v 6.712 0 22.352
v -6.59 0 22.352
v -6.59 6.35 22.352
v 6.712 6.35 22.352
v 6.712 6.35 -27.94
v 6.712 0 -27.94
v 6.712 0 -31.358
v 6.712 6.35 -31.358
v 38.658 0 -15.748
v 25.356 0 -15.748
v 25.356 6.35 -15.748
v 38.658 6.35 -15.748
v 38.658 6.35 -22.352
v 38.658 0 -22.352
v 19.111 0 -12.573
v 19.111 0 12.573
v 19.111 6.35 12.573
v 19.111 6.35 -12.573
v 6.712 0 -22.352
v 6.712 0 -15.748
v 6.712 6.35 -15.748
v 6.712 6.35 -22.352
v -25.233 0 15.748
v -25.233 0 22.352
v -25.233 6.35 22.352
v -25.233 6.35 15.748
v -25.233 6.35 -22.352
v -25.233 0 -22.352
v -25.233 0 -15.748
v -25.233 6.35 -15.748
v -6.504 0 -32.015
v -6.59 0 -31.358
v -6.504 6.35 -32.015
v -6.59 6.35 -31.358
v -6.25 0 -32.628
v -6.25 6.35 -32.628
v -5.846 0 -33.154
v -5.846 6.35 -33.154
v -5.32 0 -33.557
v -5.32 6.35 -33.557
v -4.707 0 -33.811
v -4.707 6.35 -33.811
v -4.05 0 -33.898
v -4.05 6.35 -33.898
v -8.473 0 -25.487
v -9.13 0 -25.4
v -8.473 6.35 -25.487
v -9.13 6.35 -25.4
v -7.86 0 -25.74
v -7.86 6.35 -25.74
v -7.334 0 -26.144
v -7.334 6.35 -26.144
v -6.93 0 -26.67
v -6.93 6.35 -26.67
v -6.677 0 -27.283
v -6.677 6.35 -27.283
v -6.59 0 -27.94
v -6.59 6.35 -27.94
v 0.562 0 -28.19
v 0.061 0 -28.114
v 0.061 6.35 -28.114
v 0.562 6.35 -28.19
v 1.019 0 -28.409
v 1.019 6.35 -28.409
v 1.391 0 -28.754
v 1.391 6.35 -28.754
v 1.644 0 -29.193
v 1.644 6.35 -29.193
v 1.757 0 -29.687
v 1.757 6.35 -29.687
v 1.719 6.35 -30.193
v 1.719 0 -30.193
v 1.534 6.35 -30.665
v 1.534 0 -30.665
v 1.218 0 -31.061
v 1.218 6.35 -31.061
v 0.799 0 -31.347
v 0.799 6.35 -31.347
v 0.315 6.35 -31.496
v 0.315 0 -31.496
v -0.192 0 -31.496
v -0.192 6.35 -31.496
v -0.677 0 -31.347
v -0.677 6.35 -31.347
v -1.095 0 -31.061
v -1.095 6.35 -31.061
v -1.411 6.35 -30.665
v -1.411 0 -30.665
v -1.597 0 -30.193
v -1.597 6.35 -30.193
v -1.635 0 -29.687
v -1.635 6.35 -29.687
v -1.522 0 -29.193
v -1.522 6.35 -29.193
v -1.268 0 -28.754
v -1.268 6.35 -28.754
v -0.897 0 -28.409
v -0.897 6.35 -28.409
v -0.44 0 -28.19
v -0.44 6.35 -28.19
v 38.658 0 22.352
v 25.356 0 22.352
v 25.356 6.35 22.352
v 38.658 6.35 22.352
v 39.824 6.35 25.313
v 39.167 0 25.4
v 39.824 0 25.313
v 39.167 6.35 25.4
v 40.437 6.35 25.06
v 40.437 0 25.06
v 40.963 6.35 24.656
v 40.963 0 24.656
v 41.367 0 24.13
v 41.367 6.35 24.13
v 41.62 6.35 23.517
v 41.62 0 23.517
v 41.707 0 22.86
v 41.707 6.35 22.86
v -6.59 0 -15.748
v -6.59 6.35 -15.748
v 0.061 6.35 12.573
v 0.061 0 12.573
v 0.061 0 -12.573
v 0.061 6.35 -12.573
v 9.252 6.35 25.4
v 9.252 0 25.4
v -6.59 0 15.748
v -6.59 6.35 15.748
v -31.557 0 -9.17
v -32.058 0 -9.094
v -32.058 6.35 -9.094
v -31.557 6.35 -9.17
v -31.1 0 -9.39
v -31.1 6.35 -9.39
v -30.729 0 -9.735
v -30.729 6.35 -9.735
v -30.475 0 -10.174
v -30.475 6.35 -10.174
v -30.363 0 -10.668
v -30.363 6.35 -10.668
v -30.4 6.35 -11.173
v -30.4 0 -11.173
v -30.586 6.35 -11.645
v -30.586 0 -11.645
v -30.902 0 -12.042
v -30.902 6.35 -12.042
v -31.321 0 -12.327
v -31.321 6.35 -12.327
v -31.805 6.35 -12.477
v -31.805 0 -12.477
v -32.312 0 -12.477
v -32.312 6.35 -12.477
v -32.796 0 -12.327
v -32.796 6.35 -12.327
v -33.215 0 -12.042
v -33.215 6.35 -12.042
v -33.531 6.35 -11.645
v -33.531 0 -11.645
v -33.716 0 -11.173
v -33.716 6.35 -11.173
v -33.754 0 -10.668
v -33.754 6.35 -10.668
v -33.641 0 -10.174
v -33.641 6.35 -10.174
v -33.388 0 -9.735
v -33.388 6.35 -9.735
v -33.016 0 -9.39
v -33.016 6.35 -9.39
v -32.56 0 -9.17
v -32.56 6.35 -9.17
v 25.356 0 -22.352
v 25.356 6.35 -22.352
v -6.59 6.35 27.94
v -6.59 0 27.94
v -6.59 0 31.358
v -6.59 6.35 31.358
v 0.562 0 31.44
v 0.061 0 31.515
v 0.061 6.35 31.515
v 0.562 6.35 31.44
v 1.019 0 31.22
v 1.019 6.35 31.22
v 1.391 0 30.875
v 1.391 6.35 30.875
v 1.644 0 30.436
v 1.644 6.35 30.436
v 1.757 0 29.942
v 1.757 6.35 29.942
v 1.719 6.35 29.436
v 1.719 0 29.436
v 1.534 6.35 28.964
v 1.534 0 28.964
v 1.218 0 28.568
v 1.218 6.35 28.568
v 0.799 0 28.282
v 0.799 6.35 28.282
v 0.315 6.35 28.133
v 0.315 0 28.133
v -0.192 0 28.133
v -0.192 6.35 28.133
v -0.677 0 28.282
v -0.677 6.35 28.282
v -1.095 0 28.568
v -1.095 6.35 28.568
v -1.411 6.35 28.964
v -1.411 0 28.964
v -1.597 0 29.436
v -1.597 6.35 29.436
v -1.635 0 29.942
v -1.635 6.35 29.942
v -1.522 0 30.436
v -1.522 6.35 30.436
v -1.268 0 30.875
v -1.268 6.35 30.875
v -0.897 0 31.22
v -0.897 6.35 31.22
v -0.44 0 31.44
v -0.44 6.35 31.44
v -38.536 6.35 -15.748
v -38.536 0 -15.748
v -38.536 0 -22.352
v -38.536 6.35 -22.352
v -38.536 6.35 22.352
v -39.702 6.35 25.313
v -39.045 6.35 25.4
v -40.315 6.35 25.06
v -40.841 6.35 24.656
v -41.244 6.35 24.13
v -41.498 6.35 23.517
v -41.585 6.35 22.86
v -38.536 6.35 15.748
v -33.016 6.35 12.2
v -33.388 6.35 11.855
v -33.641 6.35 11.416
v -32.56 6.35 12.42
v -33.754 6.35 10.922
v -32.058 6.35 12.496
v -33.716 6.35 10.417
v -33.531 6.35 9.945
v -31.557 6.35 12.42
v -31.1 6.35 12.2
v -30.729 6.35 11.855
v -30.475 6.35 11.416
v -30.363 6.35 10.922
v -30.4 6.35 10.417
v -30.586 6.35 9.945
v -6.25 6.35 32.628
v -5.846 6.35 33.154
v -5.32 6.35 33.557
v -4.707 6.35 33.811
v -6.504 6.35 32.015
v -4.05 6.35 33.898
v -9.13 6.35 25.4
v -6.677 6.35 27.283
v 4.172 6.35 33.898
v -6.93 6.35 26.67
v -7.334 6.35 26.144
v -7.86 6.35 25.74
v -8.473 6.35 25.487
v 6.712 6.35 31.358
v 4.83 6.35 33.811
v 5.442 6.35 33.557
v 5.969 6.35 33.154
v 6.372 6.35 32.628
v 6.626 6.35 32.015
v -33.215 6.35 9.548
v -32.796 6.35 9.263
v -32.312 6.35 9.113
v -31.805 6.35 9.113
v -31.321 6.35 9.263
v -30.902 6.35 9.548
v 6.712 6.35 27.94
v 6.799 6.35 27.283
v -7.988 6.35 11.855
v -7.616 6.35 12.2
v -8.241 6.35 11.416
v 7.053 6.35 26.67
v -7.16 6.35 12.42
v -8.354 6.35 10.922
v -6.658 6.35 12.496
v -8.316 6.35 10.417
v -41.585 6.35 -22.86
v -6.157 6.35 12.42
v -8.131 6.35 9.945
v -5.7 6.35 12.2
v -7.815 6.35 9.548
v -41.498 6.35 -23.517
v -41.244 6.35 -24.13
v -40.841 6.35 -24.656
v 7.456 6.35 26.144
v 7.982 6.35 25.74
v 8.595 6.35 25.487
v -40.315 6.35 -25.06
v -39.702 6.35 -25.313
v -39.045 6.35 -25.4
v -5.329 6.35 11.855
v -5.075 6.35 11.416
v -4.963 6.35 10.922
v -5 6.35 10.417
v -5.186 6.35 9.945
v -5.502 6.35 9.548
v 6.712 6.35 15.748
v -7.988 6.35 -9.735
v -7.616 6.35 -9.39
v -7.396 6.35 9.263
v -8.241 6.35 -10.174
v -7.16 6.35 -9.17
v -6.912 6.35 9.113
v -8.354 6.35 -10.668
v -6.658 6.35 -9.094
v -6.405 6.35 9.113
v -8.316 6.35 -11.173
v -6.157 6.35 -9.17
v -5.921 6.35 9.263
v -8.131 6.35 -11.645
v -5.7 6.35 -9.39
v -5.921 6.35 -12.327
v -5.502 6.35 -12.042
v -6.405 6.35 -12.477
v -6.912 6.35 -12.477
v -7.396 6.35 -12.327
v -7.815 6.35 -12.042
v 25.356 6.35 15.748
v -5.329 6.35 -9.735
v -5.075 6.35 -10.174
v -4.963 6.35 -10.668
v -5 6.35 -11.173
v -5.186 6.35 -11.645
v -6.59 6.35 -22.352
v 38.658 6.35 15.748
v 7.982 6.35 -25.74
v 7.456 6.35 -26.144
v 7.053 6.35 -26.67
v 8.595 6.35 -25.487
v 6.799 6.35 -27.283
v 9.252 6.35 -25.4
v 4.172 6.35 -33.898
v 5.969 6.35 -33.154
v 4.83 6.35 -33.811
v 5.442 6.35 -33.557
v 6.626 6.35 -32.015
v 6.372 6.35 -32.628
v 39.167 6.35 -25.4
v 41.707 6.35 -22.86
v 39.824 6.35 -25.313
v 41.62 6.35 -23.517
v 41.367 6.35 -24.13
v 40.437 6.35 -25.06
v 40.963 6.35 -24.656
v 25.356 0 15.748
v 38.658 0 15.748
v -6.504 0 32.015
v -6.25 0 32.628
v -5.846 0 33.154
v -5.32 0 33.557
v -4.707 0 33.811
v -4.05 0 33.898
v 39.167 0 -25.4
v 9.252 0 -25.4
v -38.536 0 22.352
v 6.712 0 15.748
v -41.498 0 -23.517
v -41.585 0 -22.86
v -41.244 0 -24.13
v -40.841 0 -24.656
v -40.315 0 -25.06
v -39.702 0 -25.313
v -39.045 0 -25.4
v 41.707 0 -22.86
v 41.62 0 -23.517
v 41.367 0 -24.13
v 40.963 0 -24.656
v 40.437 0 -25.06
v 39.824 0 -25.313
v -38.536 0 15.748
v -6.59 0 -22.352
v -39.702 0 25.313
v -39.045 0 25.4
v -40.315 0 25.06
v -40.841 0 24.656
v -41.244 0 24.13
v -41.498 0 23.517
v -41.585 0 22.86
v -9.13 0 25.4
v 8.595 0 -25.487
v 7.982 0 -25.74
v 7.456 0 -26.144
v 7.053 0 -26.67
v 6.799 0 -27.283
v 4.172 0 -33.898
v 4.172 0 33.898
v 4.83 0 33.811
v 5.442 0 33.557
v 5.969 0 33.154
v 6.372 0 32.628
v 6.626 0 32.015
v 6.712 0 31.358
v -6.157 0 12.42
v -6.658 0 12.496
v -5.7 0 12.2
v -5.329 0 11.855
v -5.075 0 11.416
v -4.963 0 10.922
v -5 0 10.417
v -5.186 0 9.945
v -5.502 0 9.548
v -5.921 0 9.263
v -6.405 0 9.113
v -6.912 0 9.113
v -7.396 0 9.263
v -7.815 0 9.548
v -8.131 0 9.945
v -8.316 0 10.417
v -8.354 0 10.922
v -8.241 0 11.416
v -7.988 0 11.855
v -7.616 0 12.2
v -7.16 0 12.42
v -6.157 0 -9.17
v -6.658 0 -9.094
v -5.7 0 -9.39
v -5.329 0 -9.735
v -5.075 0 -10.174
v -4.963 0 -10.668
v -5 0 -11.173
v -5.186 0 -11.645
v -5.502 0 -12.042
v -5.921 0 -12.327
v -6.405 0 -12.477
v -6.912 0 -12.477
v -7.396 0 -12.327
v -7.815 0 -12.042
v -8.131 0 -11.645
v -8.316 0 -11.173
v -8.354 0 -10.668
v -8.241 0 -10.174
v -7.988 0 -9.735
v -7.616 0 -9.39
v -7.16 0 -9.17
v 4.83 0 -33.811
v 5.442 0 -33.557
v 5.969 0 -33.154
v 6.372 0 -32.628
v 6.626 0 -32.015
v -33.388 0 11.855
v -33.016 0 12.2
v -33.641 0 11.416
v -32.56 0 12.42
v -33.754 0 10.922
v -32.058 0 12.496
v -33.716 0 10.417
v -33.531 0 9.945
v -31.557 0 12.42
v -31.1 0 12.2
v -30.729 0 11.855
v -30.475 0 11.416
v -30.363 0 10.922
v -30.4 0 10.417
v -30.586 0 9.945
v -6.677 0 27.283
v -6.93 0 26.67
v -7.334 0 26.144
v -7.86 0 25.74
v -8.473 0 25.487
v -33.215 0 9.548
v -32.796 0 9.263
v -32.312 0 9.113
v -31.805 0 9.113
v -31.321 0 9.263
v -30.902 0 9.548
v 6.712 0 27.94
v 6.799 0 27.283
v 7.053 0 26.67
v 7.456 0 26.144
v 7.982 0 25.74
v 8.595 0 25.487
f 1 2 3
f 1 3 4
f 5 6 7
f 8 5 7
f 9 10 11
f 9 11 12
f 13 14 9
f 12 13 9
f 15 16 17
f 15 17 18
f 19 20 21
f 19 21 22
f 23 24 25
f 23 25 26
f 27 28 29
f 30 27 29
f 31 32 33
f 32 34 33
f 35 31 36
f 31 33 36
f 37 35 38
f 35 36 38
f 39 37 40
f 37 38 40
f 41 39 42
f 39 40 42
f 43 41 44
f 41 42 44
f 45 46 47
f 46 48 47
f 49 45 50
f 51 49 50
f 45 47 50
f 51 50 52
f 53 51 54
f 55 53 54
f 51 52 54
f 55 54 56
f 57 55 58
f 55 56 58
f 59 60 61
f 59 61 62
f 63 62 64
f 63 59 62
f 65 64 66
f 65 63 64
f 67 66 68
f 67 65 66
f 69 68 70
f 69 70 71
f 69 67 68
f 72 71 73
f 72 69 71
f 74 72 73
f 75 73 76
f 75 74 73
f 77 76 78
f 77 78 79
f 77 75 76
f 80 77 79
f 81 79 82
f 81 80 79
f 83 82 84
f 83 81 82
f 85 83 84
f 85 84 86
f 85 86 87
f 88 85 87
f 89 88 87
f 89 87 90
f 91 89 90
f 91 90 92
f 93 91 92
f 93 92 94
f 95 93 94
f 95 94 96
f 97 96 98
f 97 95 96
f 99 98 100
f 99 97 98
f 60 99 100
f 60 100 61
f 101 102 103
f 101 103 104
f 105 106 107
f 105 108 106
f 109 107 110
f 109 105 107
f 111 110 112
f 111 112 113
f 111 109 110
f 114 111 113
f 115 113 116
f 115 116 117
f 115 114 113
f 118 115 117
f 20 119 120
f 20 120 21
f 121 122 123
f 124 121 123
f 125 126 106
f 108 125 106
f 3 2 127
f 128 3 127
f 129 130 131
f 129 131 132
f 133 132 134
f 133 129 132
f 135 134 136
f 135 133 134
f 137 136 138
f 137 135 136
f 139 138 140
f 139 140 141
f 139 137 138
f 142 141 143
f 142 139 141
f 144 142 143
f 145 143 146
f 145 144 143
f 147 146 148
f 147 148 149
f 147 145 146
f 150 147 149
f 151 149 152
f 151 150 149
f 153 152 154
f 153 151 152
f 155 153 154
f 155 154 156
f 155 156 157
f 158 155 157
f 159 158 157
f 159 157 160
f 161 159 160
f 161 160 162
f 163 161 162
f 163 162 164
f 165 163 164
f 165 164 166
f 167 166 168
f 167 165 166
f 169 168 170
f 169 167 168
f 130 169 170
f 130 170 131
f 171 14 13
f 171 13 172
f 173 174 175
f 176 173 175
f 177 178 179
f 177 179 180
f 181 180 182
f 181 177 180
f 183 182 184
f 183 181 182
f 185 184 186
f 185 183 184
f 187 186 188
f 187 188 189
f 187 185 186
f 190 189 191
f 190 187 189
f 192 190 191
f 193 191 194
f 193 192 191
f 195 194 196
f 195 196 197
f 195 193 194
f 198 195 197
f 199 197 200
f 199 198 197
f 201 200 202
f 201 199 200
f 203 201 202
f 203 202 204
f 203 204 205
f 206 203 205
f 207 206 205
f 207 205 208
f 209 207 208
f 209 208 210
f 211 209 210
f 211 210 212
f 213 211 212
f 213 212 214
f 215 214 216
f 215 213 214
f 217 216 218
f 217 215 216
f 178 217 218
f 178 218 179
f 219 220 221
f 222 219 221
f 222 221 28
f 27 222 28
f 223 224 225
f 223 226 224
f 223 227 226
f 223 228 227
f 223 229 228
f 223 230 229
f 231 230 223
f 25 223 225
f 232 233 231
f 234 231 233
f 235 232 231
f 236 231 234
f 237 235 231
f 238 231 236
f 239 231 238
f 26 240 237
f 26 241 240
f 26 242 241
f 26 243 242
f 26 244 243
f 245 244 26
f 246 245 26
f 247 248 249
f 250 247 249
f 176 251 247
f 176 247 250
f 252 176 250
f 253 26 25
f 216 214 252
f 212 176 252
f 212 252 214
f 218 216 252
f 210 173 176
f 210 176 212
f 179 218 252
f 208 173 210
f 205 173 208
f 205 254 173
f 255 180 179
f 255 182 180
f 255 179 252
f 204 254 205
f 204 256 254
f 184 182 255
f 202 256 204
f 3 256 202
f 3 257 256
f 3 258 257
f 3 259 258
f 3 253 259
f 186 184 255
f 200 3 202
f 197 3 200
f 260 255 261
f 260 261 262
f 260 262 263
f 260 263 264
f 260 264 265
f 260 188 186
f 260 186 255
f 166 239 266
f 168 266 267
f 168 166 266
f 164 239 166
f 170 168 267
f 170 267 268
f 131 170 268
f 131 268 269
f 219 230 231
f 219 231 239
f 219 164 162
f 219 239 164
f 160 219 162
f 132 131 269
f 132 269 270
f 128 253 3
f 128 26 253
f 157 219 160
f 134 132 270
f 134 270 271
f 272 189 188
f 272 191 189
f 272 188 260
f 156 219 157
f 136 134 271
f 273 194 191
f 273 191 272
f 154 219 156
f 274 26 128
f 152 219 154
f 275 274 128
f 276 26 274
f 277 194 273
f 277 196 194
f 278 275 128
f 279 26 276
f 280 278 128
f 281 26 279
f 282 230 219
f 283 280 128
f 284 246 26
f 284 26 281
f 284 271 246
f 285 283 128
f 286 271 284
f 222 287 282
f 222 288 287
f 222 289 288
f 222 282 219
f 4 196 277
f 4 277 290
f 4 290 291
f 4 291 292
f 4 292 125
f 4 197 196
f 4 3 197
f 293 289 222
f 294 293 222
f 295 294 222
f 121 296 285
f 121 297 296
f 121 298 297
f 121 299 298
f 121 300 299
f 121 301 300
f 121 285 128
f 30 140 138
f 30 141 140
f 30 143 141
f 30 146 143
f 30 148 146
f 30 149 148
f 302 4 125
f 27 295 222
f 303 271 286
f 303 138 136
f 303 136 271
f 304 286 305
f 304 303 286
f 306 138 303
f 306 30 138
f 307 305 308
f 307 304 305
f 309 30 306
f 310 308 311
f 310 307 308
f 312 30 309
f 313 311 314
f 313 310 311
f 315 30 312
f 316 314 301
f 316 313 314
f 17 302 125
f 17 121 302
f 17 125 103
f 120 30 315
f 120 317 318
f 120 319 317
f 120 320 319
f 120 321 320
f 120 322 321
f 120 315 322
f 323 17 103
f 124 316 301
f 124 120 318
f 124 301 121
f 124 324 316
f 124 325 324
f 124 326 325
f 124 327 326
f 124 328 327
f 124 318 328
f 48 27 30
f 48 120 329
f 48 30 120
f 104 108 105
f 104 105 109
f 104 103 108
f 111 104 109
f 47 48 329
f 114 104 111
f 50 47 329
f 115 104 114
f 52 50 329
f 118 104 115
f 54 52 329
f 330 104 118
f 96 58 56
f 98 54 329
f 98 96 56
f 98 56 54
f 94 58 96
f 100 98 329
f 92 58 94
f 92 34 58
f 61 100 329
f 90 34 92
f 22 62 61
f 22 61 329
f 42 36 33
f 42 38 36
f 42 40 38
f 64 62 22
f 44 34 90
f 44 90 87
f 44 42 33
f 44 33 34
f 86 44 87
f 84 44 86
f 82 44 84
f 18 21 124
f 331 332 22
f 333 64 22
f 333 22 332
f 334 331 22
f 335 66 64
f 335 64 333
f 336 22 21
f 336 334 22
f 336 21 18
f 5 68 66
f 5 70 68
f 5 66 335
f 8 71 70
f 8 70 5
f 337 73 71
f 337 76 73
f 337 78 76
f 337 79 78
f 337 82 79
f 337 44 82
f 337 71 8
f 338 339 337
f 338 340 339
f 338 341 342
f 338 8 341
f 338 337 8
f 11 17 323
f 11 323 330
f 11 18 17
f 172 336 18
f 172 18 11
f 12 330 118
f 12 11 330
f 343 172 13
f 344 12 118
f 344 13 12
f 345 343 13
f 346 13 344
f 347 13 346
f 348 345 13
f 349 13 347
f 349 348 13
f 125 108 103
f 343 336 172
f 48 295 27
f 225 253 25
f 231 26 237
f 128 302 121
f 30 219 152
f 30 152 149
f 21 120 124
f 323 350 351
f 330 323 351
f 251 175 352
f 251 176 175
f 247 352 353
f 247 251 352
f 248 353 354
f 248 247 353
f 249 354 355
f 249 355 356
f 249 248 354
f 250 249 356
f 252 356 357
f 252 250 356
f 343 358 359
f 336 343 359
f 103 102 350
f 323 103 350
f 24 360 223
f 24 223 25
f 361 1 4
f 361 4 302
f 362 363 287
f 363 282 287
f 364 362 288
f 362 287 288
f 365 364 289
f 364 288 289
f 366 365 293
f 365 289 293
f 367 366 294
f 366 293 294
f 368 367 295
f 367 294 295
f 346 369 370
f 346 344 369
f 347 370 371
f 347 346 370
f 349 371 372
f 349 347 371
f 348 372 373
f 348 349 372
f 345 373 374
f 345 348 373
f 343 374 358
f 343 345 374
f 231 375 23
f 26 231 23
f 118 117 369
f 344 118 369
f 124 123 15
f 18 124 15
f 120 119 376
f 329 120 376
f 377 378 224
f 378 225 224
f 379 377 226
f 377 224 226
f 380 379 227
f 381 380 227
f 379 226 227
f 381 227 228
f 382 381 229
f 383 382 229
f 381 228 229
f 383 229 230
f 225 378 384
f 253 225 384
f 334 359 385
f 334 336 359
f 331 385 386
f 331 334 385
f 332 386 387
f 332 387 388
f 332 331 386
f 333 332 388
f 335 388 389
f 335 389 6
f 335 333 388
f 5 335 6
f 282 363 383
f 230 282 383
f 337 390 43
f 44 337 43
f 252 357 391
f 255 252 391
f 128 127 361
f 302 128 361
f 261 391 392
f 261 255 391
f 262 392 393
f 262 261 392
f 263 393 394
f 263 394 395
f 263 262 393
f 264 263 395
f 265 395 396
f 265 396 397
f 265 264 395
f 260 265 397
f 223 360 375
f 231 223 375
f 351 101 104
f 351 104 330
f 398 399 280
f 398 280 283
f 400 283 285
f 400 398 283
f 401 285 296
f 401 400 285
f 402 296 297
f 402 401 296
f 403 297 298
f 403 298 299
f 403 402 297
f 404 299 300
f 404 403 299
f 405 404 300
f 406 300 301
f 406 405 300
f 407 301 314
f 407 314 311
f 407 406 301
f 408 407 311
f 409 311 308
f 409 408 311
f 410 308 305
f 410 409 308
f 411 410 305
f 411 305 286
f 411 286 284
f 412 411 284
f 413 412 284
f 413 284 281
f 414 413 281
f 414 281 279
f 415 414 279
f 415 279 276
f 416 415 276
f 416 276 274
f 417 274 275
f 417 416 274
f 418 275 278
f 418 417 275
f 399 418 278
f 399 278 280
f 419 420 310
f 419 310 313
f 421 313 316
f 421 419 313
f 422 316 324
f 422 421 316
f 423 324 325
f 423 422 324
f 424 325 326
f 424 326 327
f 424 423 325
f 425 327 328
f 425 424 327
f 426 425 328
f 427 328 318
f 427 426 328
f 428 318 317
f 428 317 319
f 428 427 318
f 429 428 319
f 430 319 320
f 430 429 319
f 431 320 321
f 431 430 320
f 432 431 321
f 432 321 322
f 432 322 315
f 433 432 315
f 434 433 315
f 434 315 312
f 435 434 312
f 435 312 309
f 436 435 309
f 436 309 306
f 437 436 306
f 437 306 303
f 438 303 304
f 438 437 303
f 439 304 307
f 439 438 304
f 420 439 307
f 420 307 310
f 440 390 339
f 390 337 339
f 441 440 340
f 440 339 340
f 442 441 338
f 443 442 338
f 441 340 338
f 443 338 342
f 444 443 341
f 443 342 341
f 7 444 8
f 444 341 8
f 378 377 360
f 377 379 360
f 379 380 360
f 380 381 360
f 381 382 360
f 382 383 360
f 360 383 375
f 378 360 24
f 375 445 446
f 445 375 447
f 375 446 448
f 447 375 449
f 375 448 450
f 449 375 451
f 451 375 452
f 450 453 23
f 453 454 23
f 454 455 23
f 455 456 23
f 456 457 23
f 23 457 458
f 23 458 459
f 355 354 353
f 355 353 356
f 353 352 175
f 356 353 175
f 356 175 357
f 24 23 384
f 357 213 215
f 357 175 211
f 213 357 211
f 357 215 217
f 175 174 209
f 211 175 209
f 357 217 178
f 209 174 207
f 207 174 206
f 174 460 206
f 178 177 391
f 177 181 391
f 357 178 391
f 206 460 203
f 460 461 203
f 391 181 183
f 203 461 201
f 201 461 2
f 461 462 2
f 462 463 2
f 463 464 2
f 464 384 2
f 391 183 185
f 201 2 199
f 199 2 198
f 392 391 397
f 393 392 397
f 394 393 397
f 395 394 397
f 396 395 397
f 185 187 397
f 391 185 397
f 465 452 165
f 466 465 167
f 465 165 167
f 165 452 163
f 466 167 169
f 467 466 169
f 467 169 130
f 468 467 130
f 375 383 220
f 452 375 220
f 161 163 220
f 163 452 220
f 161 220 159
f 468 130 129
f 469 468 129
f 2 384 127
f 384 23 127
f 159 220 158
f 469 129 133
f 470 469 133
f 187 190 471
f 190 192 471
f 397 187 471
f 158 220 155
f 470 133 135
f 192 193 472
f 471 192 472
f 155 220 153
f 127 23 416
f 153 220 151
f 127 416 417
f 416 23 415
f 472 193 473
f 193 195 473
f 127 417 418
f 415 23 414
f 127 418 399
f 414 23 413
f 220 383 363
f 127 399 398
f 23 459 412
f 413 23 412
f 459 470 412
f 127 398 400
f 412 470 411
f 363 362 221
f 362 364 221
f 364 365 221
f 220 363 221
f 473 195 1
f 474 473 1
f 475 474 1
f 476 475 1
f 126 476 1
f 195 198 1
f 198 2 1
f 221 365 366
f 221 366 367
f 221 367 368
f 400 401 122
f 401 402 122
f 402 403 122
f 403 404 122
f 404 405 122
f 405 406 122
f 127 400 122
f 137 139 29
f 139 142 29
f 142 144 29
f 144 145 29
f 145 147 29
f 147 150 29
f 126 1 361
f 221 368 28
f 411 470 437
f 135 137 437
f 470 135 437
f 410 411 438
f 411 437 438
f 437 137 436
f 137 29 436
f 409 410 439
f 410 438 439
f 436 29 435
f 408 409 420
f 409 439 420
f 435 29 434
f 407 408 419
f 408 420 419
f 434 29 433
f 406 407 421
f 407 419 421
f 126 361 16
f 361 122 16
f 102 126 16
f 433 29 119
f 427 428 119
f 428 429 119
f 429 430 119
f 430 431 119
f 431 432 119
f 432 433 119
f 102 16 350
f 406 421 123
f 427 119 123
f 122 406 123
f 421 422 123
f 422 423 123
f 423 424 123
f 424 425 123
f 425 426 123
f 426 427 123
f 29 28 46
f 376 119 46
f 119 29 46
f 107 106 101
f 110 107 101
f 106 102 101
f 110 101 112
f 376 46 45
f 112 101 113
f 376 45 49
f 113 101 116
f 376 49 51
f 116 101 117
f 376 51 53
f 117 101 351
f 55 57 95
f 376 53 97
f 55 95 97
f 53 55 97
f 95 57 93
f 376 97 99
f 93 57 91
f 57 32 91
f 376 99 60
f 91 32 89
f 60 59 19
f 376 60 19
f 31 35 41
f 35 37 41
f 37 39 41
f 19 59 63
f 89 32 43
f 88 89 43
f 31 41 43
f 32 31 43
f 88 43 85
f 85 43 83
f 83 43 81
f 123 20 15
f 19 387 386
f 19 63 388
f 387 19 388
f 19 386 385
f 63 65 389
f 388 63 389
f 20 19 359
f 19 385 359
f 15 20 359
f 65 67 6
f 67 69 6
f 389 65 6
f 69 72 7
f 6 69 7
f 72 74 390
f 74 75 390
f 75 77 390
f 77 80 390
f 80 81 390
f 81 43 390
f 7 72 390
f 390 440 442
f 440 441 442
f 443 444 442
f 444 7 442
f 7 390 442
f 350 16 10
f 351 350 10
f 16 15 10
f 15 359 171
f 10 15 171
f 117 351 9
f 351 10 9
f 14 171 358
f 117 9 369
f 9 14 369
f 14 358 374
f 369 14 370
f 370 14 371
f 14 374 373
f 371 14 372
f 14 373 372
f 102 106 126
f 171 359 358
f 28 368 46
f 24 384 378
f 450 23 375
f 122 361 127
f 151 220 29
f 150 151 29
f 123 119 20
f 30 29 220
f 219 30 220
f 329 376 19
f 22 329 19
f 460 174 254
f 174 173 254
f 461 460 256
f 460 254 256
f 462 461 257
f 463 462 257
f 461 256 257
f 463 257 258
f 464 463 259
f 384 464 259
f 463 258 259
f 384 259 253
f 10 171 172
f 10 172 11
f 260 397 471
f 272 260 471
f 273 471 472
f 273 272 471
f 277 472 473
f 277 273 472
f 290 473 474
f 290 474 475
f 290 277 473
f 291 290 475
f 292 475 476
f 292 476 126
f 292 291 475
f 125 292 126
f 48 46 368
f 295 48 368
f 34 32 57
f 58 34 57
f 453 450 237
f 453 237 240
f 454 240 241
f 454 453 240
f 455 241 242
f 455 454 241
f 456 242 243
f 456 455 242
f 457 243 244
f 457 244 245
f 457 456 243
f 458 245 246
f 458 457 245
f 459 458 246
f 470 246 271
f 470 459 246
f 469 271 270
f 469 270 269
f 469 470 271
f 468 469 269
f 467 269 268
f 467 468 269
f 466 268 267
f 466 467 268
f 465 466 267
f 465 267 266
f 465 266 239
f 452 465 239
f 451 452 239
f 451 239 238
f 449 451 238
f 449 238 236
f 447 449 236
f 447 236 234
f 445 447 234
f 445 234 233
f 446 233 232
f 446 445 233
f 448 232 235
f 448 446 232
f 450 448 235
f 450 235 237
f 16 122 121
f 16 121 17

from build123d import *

# Parameters (mm, degrees)
SKETCH1_R           = 1.70053
SKETCH1_W           = 19.05
SKETCH1_H           = 25.146
SKETCH1_W_2         = 13.302551819
SKETCH1_H_2         = 6.604
BOSS_EXTRUDE1_DEPTH = 6.35
FILLET8_R           = 2.54


with BuildPart() as part:
    # Sketch1 → Boss-Extrude1 (new body)
    with BuildSketch(Plane(origin=(0, 0, 0), x_dir=(1, 0, 0), z_dir=(0, 1, 0))):
        Polygon((-25.233245497, -25.4), (-6.59007041, -25.4), (-6.59007041, -33.89757), (6.712481409, -33.89757), (6.712481409, -25.4), (25.355656497, -25.4), (38.658208316, -25.4), (41.7070455, -25.4), (41.7070455, 25.4), (38.658208316, 25.4), (25.355656497, 25.4), (6.712481409, 25.4), (6.712481409, 33.89757), (-6.59007041, 33.89757), (-6.59007041, 25.4), (-25.233245497, 25.4), (-38.535797316, 25.4), (-41.5846345, 25.4), (-41.5846345, -25.4), (-38.535797316, -25.4), align=None)
        with Locations(Location((-32.0583645, 10.795, 0), (0, 0, 270))):
            Circle(SKETCH1_R, mode=Mode.SUBTRACT)
        with Locations(Location((-32.0583645, -10.795, 0), (0, 0, 270))):
            Circle(SKETCH1_R, mode=Mode.SUBTRACT)
        with Locations(Location((-6.6583645, -10.795, 0), (0, 0, 270))):
            Circle(SKETCH1_R, mode=Mode.SUBTRACT)
        with Locations(Location((-6.6583645, 10.795, 0), (0, 0, 270))):
            Circle(SKETCH1_R, mode=Mode.SUBTRACT)
        with Locations(Location((0.0612055, -29.81452, 0), (0, 0, 270))):
            Circle(SKETCH1_R, mode=Mode.SUBTRACT)
        with Locations(Location((0.0612055, 29.81452, 0), (0, 0, 270))):
            Circle(SKETCH1_R, mode=Mode.SUBTRACT)
        Polygon((38.658208316, 15.748), (38.658208316, 22.225), (38.658208316, 22.352), (25.355656497, 22.352), (25.355656497, 15.748), align=None, mode=Mode.SUBTRACT)
        with Locations((9.5862055, 0)):
            Rectangle(SKETCH1_W, SKETCH1_H, mode=Mode.SUBTRACT)
        with Locations((0.0612055, -19.05)):
            Rectangle(SKETCH1_W_2, SKETCH1_H_2, mode=Mode.SUBTRACT)
        with Locations((0.0612055, 19.05)):
            Rectangle(SKETCH1_W_2, SKETCH1_H_2, mode=Mode.SUBTRACT)
        Polygon((-38.535797316, 22.352), (-25.233245497, 22.352), (-25.233245497, 22.225), (-25.233245497, 15.748), (-38.535797316, 15.748), align=None, mode=Mode.SUBTRACT)
        with Locations((-31.884521406, -19.05)):
            Rectangle(SKETCH1_W_2, SKETCH1_H_2, mode=Mode.SUBTRACT)
        with Locations((32.006932406, -19.05)):
            Rectangle(SKETCH1_W_2, SKETCH1_H_2, mode=Mode.SUBTRACT)
    extrude(amount=BOSS_EXTRUDE1_DEPTH)

    # Fillet8
    fillet8_edges = [part.edges().sort_by_distance(p)[0] for p in [
        (-6.59007041, 3.175, -25.4),
        (-6.59007041, 3.175, -33.89757),
        (6.712481409, 3.175, -33.89757),
        (6.712481409, 3.175, -25.4),
        (41.7070455, 3.175, -25.4),
        (41.7070455, 3.175, 25.4),
        (6.712481409, 3.175, 25.4),
        (6.712481409, 3.175, 33.89757),
        (-6.59007041, 3.175, 33.89757),
        (-6.59007041, 3.175, 25.4),
        (-41.5846345, 3.175, 25.4),
        (-41.5846345, 3.175, -25.4),
    ]]
    fillet(fillet8_edges, radius=FILLET8_R)


solid = part.part
